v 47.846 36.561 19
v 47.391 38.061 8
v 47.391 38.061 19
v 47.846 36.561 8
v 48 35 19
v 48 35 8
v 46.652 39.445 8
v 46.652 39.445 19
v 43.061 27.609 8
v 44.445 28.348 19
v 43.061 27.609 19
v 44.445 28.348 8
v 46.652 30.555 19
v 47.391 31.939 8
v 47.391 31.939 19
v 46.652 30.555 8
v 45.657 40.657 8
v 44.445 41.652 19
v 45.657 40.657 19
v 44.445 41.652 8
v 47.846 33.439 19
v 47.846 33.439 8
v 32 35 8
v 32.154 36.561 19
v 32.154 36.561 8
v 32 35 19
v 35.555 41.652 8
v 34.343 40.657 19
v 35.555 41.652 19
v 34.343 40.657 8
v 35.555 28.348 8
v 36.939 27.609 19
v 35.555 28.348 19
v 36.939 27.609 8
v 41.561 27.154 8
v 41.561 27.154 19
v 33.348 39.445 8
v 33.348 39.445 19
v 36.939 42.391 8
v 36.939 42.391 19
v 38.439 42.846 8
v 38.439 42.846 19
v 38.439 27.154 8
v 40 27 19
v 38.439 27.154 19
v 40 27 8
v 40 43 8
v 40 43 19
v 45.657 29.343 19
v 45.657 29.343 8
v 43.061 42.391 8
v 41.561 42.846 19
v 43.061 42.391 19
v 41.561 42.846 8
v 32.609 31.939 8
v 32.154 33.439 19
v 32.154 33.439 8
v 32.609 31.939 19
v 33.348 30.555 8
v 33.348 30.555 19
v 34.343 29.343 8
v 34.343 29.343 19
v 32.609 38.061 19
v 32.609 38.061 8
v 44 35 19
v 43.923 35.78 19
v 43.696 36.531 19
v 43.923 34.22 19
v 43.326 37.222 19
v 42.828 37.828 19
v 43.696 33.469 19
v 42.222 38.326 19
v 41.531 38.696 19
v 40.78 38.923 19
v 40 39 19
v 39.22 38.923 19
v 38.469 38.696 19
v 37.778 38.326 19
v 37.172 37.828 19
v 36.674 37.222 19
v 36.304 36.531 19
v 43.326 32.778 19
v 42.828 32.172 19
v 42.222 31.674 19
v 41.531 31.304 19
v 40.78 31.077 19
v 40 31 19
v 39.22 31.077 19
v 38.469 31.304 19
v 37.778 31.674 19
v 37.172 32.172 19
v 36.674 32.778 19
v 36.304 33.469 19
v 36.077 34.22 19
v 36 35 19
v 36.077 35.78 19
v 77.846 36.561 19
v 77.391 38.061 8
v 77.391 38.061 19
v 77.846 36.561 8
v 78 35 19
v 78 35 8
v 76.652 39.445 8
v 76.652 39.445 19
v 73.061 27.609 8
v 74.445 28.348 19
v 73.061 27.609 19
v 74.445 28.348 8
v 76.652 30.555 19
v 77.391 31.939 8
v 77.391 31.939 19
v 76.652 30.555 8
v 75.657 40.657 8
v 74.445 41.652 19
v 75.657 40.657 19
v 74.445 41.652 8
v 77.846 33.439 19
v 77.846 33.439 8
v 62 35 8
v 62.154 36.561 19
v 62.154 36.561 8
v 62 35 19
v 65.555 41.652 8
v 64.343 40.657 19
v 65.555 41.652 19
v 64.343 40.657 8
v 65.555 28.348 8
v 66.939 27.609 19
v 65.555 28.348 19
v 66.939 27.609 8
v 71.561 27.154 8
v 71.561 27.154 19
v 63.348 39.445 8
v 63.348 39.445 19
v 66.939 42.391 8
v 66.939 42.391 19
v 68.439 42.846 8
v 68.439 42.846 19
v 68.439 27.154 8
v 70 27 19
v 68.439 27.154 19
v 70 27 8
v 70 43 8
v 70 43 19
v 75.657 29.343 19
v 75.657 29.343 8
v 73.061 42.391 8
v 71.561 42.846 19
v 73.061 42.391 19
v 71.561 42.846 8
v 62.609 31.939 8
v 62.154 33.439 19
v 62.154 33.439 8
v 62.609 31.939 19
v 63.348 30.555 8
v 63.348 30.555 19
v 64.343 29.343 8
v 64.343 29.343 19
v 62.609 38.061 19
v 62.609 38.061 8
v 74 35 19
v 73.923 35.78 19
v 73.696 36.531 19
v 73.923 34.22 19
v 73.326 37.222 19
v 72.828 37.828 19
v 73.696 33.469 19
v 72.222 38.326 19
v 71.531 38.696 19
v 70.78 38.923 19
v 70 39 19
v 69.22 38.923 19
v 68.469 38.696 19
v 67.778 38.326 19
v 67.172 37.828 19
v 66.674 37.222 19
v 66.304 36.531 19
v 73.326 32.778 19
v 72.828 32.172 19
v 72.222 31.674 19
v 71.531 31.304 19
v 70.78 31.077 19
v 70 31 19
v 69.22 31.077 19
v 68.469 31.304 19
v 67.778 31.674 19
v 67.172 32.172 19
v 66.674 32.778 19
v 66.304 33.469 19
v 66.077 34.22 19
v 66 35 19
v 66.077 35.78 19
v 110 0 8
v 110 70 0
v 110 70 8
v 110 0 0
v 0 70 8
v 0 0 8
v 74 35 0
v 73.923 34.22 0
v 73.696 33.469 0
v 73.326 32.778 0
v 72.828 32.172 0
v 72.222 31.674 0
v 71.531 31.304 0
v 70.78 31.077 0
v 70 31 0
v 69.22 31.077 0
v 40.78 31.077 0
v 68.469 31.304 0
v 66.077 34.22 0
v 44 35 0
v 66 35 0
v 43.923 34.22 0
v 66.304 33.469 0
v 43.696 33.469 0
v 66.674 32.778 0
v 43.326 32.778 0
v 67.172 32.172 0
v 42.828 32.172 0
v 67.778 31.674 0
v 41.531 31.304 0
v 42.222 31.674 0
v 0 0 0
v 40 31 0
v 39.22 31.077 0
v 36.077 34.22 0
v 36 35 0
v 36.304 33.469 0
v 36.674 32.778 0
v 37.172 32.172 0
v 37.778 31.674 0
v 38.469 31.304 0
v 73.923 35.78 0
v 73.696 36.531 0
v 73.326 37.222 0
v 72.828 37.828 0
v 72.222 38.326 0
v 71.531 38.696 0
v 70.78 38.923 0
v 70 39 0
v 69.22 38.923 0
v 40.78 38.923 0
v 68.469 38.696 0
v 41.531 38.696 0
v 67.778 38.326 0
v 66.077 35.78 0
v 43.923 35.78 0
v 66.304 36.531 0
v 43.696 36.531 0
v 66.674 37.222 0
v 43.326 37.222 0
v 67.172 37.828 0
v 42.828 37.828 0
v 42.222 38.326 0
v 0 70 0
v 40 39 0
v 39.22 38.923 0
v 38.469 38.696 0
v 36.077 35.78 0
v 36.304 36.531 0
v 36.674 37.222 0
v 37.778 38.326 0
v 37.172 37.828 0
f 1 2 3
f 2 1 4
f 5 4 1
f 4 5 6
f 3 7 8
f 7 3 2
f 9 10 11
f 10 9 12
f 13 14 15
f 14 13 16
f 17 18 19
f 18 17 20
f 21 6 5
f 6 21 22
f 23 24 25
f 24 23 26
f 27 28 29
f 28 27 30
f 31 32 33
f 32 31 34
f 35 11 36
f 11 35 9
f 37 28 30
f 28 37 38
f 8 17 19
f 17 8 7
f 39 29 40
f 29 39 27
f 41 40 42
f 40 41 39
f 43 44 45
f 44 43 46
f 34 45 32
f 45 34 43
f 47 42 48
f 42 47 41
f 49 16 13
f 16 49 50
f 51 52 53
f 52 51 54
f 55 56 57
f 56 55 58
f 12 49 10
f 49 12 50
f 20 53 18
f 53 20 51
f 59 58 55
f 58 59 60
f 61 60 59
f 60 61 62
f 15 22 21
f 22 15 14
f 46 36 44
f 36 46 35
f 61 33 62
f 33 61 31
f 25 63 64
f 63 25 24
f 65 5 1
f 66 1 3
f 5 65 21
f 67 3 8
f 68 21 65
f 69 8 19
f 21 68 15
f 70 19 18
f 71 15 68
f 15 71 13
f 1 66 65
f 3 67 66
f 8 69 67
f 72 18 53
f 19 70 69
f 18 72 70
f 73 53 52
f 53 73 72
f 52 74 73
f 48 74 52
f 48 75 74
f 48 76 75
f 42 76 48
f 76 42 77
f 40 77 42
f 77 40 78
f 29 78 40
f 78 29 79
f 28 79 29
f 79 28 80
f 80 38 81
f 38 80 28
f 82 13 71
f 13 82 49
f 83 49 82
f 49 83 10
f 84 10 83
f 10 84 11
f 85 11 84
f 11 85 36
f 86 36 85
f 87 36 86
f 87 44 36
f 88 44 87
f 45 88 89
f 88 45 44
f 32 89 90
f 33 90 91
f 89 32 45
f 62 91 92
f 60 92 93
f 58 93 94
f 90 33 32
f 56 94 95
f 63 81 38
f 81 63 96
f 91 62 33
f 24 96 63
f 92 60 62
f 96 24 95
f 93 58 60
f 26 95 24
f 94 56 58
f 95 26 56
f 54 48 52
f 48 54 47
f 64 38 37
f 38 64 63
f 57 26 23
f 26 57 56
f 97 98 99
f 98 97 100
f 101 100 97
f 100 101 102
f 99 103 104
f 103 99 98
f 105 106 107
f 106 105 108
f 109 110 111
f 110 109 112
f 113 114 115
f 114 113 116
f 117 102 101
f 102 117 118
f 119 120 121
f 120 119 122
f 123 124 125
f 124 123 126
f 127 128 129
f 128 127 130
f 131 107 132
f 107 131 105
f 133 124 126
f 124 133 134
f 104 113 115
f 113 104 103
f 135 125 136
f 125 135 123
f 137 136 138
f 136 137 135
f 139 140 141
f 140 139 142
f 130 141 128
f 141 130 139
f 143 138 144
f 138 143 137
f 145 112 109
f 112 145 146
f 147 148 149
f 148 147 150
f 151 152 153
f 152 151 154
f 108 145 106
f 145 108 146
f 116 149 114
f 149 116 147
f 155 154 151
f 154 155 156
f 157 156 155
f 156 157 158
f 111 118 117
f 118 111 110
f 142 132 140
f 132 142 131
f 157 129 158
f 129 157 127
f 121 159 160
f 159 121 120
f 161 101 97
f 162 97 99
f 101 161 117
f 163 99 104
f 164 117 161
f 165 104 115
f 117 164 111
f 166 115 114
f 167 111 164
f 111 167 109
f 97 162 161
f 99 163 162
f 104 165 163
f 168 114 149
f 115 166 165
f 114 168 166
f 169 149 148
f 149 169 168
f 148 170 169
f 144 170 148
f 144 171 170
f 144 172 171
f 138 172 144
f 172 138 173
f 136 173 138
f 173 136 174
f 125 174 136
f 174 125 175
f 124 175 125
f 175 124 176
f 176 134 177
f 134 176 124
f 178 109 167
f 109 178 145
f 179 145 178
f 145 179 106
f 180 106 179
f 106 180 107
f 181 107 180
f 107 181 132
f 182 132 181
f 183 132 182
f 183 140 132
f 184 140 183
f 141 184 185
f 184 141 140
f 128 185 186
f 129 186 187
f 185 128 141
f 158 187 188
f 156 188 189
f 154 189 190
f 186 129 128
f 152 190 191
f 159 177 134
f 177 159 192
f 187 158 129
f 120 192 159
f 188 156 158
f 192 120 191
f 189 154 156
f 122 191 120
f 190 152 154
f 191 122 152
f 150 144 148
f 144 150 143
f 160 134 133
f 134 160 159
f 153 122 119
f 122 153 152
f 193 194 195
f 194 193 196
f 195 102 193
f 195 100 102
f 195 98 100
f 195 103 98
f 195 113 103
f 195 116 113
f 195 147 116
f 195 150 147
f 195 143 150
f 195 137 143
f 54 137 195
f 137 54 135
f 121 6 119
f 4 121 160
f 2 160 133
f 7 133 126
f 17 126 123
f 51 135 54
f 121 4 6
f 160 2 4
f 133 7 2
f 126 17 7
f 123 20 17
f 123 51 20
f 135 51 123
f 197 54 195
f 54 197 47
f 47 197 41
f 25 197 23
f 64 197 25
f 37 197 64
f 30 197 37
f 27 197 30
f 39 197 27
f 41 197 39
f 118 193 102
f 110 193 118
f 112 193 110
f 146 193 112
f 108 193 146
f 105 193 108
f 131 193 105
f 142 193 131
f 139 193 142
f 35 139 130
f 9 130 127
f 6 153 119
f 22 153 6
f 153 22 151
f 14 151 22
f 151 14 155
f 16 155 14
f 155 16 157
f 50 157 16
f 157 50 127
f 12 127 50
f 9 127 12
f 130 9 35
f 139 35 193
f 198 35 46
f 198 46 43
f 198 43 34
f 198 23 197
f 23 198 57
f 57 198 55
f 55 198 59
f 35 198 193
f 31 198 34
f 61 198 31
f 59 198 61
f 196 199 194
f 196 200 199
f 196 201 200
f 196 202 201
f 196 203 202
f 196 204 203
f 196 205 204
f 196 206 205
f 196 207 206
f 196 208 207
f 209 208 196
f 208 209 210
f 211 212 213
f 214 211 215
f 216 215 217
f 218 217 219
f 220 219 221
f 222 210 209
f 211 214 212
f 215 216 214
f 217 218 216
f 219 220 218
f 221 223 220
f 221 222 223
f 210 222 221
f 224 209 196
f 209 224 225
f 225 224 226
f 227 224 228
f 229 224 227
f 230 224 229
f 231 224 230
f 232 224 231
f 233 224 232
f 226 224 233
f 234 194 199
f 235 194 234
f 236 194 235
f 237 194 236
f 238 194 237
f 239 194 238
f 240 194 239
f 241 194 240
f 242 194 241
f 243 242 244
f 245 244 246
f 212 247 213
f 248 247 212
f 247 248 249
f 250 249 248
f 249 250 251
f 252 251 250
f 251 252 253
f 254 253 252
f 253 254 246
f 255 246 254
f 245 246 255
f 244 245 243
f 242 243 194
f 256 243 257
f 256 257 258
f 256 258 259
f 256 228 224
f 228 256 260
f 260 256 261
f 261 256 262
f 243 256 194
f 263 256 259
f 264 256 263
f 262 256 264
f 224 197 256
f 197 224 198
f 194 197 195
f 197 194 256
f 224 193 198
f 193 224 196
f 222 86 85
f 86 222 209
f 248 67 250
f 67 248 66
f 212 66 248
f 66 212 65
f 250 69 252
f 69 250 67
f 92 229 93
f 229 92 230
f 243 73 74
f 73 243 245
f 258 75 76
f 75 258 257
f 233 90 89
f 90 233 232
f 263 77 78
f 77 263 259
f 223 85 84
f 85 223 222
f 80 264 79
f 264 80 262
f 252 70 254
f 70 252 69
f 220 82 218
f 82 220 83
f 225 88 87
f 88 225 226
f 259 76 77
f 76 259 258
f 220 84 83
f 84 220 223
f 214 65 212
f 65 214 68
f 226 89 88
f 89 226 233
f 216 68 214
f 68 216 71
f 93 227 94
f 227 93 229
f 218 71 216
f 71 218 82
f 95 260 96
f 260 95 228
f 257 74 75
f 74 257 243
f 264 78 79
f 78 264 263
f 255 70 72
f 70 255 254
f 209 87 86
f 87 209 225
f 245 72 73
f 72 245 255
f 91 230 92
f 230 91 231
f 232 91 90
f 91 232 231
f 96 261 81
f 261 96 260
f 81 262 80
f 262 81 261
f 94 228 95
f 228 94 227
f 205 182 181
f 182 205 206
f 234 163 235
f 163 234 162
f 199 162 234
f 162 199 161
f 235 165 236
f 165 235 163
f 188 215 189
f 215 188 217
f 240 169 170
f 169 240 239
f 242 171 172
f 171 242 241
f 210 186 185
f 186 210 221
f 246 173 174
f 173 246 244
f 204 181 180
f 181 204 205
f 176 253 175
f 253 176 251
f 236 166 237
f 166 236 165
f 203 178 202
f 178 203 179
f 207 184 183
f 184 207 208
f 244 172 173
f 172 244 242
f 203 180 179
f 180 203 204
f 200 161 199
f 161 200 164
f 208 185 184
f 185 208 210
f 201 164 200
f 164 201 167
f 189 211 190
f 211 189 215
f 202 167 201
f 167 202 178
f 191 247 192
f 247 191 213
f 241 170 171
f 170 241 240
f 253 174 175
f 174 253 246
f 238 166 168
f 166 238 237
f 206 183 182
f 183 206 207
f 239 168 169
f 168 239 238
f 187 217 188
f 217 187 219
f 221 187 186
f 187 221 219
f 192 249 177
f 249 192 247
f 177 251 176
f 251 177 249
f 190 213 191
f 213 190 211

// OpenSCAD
$fn = 32;

// ----------------------------------------------------------------------
// Drill jig: two_boss jig
// ----------------------------------------------------------------------

// --- parameters (mm) ---
plate_l = 110;            // plate length, X
plate_w = 70;             // plate width, Y
plate_t = 8;              // plate thickness
boss_d = 16;              // guide boss diameter
boss_h = 12;              // boss height above the plate
guide_d = 8;              // guide hole diameter
boss_pitch = 30;          // boss pitch

n_boss = 2;  // guide bosses
boss_x0 = (plate_l - (n_boss - 1) * boss_pitch) / 2;  // first boss X
boss_top = plate_t - 1 + boss_h;  // boss crown height
total_h = boss_top;  // overall height

difference() {
  union() {
  cube([plate_l, plate_w, plate_t]);
  for (i = [0 : n_boss - 1])
    translate([boss_x0 + i * boss_pitch, plate_w / 2, plate_t - 1])
      cylinder(h = boss_h, d = boss_d);
  }
  for (i = [0 : n_boss - 1])
    translate([boss_x0 + i * boss_pitch, plate_w / 2, -1])
      cylinder(h = plate_t + boss_h, d = guide_d);
}
